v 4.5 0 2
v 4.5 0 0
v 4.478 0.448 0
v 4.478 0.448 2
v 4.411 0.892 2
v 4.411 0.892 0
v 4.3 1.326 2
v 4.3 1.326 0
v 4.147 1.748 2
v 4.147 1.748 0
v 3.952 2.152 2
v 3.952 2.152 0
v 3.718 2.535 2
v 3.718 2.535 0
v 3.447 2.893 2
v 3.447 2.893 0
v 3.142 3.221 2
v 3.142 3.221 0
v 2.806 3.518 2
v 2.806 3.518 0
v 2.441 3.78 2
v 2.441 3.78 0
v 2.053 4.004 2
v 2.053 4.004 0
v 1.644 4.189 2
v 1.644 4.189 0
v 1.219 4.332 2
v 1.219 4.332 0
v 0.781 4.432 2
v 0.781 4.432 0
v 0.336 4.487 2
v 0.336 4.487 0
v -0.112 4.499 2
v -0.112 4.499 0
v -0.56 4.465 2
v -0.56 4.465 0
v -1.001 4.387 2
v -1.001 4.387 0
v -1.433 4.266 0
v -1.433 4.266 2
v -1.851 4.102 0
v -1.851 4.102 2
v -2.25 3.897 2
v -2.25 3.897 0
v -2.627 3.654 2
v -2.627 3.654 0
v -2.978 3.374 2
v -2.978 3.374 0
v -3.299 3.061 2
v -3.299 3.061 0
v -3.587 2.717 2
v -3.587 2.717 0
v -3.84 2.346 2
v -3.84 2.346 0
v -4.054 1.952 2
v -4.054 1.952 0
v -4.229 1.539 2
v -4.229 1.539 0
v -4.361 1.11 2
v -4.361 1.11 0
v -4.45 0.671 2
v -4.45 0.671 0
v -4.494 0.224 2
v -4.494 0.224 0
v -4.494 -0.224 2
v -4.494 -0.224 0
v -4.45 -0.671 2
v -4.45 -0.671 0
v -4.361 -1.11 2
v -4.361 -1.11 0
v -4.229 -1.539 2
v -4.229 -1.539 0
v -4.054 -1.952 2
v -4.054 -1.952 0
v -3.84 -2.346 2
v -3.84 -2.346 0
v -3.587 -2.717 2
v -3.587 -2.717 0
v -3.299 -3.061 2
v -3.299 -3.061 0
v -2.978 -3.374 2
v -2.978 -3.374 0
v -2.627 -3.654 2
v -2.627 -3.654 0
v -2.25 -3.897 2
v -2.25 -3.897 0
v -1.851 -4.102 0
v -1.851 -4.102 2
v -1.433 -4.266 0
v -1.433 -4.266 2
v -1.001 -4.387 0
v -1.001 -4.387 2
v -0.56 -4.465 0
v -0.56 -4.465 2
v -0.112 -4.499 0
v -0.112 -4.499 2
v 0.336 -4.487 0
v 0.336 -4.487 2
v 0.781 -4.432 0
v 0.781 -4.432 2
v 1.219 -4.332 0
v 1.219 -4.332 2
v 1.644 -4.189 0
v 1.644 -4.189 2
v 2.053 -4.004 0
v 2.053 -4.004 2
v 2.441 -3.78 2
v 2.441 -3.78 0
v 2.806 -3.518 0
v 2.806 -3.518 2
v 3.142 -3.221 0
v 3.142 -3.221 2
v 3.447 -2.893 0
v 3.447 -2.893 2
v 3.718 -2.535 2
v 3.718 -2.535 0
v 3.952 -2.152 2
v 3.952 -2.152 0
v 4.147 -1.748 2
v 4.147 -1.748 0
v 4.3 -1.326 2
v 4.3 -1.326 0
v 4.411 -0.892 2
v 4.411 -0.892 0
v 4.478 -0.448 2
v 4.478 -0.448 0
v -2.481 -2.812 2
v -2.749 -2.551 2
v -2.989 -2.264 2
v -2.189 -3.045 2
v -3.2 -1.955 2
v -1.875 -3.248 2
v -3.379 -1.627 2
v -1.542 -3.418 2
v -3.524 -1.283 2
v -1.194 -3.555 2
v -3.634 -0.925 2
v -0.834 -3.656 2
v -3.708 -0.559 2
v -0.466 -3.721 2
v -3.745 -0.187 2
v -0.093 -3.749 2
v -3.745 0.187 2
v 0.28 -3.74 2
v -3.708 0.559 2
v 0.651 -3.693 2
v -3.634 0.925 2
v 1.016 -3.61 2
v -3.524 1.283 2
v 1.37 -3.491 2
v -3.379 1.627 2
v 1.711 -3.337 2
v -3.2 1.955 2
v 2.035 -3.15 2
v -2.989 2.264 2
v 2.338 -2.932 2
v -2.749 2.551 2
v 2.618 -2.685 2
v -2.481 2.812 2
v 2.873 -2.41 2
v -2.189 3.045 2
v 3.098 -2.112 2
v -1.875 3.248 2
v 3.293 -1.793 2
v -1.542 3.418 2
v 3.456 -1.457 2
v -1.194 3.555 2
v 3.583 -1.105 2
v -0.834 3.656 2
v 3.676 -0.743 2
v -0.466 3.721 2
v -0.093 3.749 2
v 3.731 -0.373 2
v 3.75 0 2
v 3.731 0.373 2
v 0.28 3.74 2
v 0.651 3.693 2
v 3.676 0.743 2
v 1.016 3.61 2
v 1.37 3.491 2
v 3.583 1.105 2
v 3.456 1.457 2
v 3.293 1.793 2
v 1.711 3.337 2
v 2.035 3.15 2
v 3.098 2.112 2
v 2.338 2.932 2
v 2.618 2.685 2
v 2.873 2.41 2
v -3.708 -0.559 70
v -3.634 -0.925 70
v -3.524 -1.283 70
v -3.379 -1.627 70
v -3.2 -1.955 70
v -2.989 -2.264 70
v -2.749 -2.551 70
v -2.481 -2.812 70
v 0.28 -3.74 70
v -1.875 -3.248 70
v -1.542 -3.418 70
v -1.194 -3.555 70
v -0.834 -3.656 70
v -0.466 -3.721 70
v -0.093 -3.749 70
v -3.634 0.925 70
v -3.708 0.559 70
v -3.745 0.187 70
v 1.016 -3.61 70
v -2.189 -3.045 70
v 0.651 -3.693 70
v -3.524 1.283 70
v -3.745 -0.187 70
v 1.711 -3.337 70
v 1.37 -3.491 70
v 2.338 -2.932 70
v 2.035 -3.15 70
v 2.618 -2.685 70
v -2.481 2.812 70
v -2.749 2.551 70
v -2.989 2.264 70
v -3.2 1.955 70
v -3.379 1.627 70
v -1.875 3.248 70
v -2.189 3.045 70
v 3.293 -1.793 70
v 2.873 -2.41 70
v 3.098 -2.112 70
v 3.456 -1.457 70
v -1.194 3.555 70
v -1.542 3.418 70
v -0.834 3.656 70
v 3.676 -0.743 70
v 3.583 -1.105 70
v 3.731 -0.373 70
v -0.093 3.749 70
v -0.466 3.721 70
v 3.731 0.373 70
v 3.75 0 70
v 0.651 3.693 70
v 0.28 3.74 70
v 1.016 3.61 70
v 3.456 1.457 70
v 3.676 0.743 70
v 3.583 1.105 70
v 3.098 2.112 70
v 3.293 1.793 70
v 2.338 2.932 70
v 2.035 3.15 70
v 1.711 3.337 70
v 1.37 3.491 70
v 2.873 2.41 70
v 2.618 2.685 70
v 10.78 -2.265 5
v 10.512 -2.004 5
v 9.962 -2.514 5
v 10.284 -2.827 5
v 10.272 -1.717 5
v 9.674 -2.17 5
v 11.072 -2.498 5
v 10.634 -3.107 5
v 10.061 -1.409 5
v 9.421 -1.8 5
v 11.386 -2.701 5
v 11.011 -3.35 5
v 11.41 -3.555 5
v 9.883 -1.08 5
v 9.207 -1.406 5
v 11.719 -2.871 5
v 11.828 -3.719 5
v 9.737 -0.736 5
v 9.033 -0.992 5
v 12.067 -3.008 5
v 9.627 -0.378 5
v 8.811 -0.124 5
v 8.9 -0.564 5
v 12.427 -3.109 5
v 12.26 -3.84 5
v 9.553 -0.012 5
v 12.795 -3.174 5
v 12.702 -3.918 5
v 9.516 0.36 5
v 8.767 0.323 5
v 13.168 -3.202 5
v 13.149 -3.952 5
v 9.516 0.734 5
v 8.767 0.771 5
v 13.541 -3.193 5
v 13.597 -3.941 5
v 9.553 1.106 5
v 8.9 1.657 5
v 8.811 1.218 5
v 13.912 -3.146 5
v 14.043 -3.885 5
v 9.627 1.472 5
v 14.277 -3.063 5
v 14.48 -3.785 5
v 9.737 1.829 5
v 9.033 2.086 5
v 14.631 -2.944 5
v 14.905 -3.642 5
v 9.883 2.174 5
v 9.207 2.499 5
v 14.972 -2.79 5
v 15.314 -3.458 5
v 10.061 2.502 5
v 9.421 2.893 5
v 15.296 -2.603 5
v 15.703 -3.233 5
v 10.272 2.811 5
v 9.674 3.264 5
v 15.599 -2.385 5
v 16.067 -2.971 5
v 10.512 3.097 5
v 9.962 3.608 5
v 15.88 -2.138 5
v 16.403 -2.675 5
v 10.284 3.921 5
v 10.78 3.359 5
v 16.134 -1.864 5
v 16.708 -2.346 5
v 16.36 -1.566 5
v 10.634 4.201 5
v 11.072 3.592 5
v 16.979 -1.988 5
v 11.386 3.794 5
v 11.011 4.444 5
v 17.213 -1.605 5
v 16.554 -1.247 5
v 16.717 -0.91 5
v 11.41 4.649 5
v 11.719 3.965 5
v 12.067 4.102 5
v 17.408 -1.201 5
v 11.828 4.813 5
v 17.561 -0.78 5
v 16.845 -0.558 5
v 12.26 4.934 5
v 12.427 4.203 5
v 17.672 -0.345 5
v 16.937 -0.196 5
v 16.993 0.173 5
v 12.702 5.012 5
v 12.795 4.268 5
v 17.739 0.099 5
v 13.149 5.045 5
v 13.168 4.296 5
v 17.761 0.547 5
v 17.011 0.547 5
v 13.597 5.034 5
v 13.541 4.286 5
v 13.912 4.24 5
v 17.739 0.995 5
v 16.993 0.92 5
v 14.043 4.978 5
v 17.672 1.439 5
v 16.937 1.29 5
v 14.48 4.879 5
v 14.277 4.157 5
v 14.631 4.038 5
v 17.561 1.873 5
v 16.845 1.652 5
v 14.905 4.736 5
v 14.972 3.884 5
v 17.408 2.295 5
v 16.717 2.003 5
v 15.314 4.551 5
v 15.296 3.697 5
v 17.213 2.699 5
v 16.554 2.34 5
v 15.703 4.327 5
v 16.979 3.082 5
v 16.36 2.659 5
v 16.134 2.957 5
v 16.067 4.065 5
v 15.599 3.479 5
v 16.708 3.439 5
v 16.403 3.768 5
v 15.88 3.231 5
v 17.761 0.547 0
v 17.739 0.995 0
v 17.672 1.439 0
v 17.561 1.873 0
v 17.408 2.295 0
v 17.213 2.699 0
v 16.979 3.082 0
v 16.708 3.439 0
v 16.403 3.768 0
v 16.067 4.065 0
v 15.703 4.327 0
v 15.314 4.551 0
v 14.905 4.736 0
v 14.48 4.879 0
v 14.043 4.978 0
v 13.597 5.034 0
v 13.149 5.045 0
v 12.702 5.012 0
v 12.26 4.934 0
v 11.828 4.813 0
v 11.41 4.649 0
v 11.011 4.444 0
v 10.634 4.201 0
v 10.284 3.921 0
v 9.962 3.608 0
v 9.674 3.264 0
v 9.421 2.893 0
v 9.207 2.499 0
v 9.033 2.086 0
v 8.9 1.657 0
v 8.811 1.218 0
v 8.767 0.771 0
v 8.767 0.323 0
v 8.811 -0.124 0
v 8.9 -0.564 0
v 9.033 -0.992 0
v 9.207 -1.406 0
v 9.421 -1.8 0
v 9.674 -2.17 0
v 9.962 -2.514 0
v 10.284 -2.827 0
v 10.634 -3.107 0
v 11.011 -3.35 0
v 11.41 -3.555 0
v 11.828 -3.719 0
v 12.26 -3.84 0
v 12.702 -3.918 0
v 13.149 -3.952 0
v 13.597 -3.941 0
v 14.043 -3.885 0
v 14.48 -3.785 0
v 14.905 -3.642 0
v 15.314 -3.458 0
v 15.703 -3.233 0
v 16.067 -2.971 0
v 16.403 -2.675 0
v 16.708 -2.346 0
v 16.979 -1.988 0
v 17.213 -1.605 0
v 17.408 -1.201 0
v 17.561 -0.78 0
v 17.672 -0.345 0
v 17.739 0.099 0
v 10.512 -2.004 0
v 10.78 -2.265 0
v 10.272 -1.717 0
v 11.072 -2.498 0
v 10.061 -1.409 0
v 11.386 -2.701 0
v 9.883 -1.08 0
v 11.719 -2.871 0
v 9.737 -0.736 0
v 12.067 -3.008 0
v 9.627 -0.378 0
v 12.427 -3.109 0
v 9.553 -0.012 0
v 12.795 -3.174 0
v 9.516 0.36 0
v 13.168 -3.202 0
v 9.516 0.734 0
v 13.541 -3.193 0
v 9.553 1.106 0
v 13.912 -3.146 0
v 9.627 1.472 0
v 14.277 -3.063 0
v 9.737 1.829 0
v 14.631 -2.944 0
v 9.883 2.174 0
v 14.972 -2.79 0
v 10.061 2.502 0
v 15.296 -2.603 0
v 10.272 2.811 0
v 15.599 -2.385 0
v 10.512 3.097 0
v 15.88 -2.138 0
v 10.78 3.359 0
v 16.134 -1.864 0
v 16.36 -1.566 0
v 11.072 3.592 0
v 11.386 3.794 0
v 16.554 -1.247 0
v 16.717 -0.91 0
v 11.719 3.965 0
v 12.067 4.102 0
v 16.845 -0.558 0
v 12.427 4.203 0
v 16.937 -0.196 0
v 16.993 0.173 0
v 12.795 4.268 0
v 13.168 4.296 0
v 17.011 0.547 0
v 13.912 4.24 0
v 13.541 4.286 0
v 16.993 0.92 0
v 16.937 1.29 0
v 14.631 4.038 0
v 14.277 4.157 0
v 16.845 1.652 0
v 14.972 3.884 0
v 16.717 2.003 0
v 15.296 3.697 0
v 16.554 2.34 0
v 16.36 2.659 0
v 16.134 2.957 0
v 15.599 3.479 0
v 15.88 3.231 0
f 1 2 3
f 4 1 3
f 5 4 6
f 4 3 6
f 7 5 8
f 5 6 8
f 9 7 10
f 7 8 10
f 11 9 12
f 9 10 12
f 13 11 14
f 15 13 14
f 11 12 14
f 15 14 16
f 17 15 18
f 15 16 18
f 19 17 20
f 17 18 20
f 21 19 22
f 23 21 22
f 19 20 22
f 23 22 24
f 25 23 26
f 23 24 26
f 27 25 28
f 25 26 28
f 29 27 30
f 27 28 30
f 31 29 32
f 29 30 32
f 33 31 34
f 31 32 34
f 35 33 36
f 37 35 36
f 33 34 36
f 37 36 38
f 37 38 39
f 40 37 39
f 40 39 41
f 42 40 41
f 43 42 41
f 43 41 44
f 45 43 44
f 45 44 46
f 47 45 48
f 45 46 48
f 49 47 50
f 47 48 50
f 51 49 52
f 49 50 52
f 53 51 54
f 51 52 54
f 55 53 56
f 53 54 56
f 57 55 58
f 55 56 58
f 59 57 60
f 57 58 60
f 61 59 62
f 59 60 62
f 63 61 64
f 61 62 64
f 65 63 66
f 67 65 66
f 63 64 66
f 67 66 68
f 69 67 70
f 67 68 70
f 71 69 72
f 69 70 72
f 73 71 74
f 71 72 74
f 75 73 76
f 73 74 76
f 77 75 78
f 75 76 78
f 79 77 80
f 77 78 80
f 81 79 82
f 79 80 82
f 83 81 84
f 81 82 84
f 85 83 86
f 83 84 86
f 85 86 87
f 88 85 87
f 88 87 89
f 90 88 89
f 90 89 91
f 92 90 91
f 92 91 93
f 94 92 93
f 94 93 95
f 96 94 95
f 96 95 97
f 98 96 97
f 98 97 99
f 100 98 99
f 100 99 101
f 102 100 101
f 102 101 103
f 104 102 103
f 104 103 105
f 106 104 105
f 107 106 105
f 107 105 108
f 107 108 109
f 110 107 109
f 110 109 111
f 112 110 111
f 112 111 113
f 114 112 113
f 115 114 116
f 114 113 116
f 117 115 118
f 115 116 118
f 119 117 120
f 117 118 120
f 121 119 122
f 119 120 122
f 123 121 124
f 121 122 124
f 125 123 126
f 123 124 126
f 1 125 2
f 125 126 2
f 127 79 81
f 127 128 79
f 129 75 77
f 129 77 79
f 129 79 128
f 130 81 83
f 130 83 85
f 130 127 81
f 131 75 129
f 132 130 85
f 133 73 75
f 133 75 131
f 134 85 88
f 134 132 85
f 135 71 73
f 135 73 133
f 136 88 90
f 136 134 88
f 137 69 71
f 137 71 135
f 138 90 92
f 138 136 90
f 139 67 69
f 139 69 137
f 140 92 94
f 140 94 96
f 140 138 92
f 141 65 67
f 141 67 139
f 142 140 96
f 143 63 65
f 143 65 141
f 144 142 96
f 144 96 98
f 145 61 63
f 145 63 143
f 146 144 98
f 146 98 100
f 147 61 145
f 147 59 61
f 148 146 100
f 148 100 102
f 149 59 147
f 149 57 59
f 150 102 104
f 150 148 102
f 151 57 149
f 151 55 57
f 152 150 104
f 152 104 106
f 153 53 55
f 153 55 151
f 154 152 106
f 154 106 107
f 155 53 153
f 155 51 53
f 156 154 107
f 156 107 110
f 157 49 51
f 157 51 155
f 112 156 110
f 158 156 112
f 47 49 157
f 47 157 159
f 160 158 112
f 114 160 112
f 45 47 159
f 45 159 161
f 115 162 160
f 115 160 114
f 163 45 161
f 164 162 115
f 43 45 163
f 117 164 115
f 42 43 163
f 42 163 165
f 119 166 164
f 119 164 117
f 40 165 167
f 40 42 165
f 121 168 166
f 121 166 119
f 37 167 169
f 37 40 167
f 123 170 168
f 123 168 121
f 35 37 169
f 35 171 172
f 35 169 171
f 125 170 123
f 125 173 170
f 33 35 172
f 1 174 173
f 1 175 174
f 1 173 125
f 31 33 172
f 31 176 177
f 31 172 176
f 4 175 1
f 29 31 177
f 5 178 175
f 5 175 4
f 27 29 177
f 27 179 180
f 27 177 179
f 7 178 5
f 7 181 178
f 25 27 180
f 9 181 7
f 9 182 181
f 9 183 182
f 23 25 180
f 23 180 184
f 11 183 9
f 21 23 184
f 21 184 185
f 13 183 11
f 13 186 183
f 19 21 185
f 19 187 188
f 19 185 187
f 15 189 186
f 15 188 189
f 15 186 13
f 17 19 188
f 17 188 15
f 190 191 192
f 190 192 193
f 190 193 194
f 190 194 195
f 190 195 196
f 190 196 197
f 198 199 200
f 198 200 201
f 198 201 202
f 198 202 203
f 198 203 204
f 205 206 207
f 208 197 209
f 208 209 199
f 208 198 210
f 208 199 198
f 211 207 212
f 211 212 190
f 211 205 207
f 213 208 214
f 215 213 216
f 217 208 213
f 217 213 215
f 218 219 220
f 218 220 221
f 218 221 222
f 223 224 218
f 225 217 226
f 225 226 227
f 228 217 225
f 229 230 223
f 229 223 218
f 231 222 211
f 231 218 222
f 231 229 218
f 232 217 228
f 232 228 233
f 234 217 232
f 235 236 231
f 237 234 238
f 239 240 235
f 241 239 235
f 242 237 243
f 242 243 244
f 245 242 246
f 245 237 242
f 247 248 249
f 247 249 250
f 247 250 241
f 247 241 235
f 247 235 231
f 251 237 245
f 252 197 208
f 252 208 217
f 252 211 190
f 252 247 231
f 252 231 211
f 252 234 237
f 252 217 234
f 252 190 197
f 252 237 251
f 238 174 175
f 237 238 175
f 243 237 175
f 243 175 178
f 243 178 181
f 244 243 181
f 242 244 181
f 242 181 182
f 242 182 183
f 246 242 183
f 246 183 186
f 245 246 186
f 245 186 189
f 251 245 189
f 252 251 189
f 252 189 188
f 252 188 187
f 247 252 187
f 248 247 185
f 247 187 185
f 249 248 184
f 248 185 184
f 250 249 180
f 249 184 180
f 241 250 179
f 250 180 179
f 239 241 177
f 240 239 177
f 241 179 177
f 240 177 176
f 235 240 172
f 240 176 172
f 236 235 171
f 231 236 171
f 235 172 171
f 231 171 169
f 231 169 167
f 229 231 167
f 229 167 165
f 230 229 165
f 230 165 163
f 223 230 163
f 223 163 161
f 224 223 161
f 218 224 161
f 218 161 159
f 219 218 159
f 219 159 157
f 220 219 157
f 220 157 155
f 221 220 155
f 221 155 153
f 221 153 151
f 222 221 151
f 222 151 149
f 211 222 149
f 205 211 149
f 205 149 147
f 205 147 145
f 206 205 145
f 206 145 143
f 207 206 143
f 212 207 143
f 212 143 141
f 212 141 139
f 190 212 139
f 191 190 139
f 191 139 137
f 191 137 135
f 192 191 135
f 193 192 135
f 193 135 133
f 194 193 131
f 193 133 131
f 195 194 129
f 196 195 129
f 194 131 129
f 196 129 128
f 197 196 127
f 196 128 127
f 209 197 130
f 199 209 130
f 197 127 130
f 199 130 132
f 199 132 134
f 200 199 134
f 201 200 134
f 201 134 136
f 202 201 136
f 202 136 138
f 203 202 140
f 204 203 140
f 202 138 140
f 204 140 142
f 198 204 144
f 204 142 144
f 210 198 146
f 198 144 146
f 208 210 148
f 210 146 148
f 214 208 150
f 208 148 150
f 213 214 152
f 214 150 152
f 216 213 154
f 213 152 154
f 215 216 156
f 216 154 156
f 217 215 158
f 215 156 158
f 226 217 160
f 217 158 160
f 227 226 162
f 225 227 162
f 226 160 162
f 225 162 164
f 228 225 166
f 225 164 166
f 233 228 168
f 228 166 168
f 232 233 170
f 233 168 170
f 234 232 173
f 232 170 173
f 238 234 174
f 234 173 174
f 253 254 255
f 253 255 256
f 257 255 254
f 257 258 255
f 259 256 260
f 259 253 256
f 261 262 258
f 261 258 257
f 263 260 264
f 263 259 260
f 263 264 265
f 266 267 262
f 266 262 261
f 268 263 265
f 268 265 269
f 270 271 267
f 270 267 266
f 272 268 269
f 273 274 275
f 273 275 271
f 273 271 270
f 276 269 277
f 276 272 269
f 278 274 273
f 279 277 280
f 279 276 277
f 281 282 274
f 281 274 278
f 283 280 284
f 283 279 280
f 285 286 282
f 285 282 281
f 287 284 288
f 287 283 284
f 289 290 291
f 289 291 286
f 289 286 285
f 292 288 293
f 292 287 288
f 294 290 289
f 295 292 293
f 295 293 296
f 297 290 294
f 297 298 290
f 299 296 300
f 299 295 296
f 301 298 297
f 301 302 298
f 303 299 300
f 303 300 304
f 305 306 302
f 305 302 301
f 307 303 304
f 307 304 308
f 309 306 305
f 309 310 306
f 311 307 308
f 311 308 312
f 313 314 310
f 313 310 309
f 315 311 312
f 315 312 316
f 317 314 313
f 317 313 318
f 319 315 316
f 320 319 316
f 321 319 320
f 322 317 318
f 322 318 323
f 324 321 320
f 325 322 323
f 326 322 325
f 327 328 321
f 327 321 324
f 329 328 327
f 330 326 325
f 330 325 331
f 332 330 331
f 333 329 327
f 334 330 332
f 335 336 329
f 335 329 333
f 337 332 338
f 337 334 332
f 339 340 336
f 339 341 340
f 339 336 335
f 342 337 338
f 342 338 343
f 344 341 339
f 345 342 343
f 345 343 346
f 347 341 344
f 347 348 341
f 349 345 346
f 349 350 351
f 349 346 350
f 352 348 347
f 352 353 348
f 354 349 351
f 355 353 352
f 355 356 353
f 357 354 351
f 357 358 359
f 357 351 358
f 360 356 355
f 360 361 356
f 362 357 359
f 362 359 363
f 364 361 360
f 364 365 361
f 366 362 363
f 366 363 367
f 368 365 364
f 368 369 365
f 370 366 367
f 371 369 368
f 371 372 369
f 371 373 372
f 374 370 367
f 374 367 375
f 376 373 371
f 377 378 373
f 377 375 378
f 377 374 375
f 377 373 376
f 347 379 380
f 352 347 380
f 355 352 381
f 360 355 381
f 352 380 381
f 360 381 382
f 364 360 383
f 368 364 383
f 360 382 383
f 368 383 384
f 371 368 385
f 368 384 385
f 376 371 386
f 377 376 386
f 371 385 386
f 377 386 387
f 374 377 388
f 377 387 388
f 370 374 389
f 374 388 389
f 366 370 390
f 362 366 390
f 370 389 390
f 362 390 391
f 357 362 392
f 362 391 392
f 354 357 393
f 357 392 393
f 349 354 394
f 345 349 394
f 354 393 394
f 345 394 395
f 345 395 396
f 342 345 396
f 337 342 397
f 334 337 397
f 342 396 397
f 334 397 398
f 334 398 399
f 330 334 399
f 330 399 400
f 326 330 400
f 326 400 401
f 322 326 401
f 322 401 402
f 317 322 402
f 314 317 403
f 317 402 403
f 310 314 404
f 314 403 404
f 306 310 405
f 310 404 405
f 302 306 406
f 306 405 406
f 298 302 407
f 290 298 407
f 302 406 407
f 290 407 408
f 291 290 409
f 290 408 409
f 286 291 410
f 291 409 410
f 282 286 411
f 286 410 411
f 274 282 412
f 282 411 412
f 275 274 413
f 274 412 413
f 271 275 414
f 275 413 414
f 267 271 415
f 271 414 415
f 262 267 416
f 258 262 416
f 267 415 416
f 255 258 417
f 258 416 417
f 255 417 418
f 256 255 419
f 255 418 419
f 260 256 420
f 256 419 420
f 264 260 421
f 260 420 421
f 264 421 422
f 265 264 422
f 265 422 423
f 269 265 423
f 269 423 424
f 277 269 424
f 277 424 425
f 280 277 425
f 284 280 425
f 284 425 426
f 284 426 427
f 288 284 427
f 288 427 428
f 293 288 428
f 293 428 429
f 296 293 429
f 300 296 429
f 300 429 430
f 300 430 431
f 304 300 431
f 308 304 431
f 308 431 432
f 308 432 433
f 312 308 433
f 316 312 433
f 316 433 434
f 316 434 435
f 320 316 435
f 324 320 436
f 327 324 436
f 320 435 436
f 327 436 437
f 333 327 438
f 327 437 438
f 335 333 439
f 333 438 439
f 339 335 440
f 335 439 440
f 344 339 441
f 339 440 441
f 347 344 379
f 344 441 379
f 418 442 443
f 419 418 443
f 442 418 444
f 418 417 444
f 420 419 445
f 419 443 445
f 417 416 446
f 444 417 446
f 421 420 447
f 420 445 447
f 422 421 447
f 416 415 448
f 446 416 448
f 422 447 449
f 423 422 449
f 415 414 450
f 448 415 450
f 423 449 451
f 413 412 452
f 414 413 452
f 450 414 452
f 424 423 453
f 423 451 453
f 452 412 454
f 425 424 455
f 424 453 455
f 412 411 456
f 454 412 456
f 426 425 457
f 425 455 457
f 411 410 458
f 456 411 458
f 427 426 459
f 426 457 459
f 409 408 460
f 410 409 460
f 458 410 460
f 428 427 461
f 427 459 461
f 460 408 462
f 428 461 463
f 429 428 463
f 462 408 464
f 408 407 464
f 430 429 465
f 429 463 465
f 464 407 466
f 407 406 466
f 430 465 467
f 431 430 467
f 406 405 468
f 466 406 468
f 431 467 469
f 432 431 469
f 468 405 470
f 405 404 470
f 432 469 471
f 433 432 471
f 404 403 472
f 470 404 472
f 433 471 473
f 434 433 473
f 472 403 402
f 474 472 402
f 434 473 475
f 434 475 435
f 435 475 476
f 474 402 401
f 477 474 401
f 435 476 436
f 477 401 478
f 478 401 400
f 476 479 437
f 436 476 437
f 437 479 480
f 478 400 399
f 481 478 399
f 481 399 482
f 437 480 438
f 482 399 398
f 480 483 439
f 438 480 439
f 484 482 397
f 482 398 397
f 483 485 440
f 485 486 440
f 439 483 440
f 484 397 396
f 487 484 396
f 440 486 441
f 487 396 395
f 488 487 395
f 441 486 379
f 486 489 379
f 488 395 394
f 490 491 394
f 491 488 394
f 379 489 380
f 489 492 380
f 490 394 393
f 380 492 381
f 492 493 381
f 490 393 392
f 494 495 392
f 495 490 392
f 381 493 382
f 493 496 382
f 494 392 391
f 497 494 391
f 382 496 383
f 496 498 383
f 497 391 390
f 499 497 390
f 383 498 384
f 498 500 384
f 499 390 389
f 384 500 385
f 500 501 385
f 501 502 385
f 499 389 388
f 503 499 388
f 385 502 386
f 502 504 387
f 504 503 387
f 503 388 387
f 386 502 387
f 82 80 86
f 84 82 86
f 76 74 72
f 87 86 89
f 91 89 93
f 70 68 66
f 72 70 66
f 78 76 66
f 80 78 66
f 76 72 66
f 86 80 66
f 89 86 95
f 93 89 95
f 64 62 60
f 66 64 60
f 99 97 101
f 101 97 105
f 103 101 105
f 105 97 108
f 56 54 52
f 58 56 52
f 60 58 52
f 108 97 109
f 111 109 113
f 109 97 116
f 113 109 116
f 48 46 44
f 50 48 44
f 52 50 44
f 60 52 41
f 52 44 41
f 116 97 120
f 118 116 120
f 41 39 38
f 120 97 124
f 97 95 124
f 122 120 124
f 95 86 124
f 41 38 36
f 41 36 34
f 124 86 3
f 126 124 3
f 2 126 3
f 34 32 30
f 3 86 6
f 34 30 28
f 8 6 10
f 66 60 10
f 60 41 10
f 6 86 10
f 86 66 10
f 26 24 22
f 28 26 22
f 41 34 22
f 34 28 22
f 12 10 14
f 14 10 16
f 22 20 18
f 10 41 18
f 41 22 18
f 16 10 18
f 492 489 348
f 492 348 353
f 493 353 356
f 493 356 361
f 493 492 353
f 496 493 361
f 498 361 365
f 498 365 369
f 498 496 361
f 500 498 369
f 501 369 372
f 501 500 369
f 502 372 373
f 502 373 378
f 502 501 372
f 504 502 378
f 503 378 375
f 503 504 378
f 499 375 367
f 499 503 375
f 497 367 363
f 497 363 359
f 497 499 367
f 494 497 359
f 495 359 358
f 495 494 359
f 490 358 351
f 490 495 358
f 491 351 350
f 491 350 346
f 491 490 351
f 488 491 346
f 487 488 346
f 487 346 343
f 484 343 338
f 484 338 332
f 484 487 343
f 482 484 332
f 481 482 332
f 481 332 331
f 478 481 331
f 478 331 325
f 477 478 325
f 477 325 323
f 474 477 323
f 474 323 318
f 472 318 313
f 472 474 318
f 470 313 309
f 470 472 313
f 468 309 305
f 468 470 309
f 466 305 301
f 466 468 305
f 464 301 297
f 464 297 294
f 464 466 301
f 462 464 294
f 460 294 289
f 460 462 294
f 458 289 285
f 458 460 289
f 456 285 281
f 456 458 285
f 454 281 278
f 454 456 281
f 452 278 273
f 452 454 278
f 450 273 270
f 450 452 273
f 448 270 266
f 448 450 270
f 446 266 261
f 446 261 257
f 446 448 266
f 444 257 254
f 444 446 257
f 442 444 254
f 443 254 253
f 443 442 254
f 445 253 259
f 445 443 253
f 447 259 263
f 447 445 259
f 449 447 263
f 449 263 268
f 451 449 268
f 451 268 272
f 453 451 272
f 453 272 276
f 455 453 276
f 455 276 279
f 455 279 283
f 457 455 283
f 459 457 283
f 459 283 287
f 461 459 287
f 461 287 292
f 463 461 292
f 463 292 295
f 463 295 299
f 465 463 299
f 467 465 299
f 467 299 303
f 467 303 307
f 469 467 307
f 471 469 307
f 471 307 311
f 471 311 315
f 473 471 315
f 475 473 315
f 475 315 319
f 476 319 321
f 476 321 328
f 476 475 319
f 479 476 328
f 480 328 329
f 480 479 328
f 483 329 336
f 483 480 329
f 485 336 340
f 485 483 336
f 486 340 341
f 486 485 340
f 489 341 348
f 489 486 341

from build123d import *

# Parameters (mm, degrees)
F0_R     = 3.75
F2_DEPTH = 70
F0_R_2   = 4.5
F3_DEPTH = 2
F1_R     = 4.5
F1_R_2   = 3.75
F4_DEPTH = 5


with BuildPart() as f2:
    # F0 (on Top) → F2 (new body)
    with BuildSketch(Plane.XY):
        Circle(F0_R)
    extrude(amount=F2_DEPTH)

    # F0 (on Top) → F3 (join)
    with BuildSketch(Plane.XY):
        Circle(F0_R_2)
        Circle(F0_R, mode=Mode.SUBTRACT)
    extrude(amount=F3_DEPTH)


with BuildPart() as f4:
    # F1 (on Top) → F4 (new body)
    with BuildSketch(Plane.XY):
        with Locations((13.261163, 0.546843)):
            Circle(F1_R)
        with Locations((13.261163, 0.546843)):
            Circle(F1_R_2, mode=Mode.SUBTRACT)
    extrude(amount=F4_DEPTH)


solid = Compound([f2.part, f4.part])
